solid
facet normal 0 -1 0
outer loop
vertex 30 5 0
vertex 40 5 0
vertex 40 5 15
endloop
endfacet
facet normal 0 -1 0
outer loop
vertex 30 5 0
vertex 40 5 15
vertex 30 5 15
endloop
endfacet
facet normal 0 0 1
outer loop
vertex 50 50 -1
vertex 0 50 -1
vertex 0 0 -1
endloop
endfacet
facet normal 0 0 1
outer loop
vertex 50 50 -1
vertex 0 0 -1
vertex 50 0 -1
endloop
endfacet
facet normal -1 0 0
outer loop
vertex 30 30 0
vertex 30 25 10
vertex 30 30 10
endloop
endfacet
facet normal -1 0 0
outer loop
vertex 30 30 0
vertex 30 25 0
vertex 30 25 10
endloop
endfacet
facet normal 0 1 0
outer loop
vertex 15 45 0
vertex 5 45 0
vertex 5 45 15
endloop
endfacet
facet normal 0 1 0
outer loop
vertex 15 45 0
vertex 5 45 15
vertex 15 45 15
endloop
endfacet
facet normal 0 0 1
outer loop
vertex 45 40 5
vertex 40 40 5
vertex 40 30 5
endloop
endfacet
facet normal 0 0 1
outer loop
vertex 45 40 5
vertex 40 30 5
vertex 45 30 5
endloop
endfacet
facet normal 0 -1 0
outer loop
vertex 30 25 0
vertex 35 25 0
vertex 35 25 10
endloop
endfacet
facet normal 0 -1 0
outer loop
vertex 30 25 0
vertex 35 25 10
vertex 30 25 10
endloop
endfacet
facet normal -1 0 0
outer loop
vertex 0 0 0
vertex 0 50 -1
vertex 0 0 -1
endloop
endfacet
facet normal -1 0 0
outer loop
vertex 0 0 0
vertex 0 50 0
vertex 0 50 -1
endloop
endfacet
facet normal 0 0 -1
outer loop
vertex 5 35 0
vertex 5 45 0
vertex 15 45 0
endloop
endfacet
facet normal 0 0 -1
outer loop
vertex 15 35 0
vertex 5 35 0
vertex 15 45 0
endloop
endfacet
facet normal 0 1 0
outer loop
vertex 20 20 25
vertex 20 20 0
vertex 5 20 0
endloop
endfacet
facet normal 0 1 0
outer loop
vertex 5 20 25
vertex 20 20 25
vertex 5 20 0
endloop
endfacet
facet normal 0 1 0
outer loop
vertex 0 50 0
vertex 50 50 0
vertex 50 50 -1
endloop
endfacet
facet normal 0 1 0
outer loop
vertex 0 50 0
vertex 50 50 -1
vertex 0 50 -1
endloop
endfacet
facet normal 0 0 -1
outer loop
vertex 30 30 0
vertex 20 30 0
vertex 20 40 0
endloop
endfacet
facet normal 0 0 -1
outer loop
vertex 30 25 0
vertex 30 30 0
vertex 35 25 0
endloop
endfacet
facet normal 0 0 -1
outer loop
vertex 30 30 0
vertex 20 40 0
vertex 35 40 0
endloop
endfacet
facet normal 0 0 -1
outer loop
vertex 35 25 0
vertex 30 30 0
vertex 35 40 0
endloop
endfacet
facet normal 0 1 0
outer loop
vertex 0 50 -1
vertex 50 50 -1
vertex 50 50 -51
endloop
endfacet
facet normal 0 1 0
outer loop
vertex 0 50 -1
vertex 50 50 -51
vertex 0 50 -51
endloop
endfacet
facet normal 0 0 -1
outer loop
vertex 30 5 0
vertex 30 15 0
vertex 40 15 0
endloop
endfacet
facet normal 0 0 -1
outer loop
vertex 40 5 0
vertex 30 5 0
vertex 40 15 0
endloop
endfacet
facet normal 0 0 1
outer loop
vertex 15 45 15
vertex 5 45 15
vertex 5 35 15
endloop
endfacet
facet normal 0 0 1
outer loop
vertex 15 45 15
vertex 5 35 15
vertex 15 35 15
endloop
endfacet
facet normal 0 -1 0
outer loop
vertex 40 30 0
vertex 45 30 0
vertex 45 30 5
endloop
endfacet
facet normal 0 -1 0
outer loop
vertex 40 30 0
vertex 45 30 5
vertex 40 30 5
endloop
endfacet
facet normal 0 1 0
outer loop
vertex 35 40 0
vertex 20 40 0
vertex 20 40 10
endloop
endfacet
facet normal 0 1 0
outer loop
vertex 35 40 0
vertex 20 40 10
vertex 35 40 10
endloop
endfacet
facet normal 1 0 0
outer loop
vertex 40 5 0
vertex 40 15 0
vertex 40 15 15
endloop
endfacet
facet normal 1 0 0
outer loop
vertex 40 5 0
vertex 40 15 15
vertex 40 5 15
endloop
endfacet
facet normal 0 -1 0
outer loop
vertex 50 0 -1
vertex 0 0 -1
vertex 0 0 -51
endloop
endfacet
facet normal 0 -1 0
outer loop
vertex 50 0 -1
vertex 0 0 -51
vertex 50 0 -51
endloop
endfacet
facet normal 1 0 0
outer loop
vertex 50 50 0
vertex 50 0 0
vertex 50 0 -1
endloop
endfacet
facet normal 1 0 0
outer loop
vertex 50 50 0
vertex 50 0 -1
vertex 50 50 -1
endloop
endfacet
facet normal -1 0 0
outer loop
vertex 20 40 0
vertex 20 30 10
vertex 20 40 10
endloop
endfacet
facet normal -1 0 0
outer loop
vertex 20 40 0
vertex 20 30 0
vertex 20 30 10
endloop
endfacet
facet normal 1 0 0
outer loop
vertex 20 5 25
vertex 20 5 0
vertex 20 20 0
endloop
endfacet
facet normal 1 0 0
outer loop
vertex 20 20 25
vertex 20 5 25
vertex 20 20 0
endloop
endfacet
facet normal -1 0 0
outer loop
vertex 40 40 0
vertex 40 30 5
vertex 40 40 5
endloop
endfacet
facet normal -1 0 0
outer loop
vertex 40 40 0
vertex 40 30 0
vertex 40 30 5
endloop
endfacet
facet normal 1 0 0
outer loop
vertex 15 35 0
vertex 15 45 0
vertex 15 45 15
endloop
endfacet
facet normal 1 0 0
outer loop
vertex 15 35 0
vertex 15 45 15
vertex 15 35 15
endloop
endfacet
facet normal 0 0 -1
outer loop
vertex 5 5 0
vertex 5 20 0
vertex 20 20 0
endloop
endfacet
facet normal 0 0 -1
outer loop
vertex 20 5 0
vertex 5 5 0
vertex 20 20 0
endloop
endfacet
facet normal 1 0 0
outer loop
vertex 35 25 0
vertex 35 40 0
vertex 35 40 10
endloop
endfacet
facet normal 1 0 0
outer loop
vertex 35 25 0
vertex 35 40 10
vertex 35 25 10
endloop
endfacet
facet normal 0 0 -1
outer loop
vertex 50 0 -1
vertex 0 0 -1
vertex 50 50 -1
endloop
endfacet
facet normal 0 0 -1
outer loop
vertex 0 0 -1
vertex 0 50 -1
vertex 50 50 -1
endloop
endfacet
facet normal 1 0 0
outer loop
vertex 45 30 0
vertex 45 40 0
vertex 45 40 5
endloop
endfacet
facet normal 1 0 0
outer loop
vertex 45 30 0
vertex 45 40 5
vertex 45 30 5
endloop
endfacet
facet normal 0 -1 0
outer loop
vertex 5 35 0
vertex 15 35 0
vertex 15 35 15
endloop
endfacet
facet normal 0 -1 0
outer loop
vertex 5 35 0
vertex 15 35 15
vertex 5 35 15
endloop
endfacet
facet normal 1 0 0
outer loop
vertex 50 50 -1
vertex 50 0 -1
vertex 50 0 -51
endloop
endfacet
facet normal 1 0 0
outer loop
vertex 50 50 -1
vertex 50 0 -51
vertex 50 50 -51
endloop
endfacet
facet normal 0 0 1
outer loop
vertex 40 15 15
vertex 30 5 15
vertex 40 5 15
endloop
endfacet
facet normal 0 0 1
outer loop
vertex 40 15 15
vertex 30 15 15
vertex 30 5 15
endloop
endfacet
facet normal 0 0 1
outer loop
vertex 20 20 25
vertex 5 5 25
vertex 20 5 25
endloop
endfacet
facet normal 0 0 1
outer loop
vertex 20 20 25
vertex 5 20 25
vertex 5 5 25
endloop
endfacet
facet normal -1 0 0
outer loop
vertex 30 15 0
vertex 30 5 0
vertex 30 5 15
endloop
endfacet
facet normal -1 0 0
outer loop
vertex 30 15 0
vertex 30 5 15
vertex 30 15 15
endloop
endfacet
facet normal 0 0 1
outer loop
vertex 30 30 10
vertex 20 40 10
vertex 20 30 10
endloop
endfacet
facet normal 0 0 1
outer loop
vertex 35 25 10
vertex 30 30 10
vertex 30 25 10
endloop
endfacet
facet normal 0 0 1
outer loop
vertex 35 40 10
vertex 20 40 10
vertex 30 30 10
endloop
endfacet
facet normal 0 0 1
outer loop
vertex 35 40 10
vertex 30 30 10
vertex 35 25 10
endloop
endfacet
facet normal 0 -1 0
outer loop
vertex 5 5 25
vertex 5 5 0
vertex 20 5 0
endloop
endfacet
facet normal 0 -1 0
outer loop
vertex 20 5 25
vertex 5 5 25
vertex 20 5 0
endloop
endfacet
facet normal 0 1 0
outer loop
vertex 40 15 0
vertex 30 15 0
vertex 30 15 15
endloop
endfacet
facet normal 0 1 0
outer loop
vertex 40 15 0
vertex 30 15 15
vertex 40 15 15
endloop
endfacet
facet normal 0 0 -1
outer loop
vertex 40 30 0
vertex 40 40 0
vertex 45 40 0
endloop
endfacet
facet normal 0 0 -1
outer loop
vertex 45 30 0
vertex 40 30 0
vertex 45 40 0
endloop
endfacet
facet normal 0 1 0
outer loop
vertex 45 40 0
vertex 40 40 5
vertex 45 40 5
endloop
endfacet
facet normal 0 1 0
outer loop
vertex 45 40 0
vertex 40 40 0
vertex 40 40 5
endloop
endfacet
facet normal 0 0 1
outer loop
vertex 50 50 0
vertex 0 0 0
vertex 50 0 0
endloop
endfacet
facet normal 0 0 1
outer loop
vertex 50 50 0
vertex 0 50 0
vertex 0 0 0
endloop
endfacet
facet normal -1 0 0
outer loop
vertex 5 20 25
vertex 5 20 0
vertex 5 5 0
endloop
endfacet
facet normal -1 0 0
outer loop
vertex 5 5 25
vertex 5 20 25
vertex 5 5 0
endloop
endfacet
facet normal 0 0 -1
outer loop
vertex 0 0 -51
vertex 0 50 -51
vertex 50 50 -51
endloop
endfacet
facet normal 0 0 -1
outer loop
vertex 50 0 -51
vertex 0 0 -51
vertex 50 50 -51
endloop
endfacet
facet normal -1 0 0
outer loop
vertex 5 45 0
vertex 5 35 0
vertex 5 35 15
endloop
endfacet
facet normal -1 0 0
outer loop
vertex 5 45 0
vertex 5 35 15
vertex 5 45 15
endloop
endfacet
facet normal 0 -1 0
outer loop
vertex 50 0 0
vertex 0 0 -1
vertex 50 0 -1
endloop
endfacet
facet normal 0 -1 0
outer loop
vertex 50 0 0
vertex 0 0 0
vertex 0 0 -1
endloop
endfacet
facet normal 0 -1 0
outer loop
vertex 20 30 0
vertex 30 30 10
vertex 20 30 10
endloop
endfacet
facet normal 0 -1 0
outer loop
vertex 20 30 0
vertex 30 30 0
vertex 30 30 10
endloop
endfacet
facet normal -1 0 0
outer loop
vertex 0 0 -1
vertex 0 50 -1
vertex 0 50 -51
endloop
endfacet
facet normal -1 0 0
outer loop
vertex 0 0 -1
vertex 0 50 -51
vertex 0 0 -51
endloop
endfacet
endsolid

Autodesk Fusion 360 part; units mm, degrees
sketch "Skizze1" plane through (0, 0, 0) normal (0, 0, 1) x (1, 0, 0)
  line L0 (0, 0) -> (50, 0)
  line L1 (50, 0) -> (50, 50)
  line L2 (50, 50) -> (0, 50)
  line L3 (0, 50) -> (0, 0)
  line L4 (20, 20) -> (5, 20)
  line L5 (5, 20) -> (5, 5)
  line L6 (5, 5) -> (20, 5)
  line L7 (20, 5) -> (20, 20)
  line L8 (20, 40) -> (35, 40)
  line L9 (35, 40) -> (35, 25)
  line L10 (35, 25) -> (30, 25)
  line L11 (30, 25) -> (30, 30)
  line L12 (30, 30) -> (20, 30)
  line L13 (20, 30) -> (20, 40)
  line L14 (5, 45) -> (15, 45)
  line L15 (15, 45) -> (15, 35)
  line L16 (15, 35) -> (5, 35)
  line L17 (5, 35) -> (5, 45)
  line L18 (30, 15) -> (40, 15)
  line L19 (40, 15) -> (40, 5)
  line L20 (40, 5) -> (30, 5)
  line L21 (30, 5) -> (30, 15)
  line L22 (40, 40) -> (45, 40)
  line L23 (45, 40) -> (45, 30)
  line L24 (45, 30) -> (40, 30)
  line L25 (40, 30) -> (40, 40)
extrude "Extrusion1" add sketch "Skizze1" along normal blind 25 contours L4 L5 L6 L7 makes body 1 in component "Großer Block"
extrude "Extrusion1'" add sketch "Skizze1" along normal blind 15 separate body contours L18 L19 L20 L21 makes body 2 in component "Medium Block 1"
extrude "Extrusion1''" add sketch "Skizze1" along normal blind 15 separate body contours L14 L15 L16 L17 makes body 3 in component "Medium Block 2#"
extrude "Extrusion1'''" add sketch "Skizze1" along normal blind 10 separate body contours L8 L9 L10 L11 L12 L13 makes body 4 in component "L Block"
extrude "Extrusion1''''" add sketch "Skizze1" along normal blind 5 separate body contours L22 L23 L24 L25 makes body 5 in component "Smal Block 1"
extrude "Extrusion1'''''" add sketch "Skizze1" against normal blind 1 separate body contours L0 L1 L2 L3 | L4 L5 L6 L7 | L8 L9 L10 L11 L12 L13 | L14 L15 L16 L17 | L18 L19 L20 L21 | L22 L23 L24 L25 makes body 6 in component "Boden"
extrude "Extrusion1''''''" add 1 faces at (16.6667, 33.3333, -1) along direction (0, 0, -1) blind 50 separate body on bodies 6 makes body 7 in component "Ground below"
component "Großer Block" placed x (1, 0, 0) y (0, 1, 0) z (0, 0, 1) at (0, 0, 0)
component "Medium Block 1" placed x (1, 0, 0) y (0, 1, 0) z (0, 0, 1) at (0, 0, 0)
component "Medium Block 2#" placed x (1, 0, 0) y (0, 1, 0) z (0, 0, 1) at (0, 0, 0)
component "L Block" placed x (1, 0, 0) y (0, 1, 0) z (0, 0, 1) at (0, 0, 0)
component "Smal Block 1" placed x (1, 0, 0) y (0, 1, 0) z (0, 0, 1) at (0, 0, 0)
component "Boden" placed x (1, 0, 0) y (0, 1, 0) z (0, 0, 1) at (0, 0, 0)
component "Ground below" placed x (1, 0, 0) y (0, 1, 0) z (0, 0, 1) at (0, 0, 0)
